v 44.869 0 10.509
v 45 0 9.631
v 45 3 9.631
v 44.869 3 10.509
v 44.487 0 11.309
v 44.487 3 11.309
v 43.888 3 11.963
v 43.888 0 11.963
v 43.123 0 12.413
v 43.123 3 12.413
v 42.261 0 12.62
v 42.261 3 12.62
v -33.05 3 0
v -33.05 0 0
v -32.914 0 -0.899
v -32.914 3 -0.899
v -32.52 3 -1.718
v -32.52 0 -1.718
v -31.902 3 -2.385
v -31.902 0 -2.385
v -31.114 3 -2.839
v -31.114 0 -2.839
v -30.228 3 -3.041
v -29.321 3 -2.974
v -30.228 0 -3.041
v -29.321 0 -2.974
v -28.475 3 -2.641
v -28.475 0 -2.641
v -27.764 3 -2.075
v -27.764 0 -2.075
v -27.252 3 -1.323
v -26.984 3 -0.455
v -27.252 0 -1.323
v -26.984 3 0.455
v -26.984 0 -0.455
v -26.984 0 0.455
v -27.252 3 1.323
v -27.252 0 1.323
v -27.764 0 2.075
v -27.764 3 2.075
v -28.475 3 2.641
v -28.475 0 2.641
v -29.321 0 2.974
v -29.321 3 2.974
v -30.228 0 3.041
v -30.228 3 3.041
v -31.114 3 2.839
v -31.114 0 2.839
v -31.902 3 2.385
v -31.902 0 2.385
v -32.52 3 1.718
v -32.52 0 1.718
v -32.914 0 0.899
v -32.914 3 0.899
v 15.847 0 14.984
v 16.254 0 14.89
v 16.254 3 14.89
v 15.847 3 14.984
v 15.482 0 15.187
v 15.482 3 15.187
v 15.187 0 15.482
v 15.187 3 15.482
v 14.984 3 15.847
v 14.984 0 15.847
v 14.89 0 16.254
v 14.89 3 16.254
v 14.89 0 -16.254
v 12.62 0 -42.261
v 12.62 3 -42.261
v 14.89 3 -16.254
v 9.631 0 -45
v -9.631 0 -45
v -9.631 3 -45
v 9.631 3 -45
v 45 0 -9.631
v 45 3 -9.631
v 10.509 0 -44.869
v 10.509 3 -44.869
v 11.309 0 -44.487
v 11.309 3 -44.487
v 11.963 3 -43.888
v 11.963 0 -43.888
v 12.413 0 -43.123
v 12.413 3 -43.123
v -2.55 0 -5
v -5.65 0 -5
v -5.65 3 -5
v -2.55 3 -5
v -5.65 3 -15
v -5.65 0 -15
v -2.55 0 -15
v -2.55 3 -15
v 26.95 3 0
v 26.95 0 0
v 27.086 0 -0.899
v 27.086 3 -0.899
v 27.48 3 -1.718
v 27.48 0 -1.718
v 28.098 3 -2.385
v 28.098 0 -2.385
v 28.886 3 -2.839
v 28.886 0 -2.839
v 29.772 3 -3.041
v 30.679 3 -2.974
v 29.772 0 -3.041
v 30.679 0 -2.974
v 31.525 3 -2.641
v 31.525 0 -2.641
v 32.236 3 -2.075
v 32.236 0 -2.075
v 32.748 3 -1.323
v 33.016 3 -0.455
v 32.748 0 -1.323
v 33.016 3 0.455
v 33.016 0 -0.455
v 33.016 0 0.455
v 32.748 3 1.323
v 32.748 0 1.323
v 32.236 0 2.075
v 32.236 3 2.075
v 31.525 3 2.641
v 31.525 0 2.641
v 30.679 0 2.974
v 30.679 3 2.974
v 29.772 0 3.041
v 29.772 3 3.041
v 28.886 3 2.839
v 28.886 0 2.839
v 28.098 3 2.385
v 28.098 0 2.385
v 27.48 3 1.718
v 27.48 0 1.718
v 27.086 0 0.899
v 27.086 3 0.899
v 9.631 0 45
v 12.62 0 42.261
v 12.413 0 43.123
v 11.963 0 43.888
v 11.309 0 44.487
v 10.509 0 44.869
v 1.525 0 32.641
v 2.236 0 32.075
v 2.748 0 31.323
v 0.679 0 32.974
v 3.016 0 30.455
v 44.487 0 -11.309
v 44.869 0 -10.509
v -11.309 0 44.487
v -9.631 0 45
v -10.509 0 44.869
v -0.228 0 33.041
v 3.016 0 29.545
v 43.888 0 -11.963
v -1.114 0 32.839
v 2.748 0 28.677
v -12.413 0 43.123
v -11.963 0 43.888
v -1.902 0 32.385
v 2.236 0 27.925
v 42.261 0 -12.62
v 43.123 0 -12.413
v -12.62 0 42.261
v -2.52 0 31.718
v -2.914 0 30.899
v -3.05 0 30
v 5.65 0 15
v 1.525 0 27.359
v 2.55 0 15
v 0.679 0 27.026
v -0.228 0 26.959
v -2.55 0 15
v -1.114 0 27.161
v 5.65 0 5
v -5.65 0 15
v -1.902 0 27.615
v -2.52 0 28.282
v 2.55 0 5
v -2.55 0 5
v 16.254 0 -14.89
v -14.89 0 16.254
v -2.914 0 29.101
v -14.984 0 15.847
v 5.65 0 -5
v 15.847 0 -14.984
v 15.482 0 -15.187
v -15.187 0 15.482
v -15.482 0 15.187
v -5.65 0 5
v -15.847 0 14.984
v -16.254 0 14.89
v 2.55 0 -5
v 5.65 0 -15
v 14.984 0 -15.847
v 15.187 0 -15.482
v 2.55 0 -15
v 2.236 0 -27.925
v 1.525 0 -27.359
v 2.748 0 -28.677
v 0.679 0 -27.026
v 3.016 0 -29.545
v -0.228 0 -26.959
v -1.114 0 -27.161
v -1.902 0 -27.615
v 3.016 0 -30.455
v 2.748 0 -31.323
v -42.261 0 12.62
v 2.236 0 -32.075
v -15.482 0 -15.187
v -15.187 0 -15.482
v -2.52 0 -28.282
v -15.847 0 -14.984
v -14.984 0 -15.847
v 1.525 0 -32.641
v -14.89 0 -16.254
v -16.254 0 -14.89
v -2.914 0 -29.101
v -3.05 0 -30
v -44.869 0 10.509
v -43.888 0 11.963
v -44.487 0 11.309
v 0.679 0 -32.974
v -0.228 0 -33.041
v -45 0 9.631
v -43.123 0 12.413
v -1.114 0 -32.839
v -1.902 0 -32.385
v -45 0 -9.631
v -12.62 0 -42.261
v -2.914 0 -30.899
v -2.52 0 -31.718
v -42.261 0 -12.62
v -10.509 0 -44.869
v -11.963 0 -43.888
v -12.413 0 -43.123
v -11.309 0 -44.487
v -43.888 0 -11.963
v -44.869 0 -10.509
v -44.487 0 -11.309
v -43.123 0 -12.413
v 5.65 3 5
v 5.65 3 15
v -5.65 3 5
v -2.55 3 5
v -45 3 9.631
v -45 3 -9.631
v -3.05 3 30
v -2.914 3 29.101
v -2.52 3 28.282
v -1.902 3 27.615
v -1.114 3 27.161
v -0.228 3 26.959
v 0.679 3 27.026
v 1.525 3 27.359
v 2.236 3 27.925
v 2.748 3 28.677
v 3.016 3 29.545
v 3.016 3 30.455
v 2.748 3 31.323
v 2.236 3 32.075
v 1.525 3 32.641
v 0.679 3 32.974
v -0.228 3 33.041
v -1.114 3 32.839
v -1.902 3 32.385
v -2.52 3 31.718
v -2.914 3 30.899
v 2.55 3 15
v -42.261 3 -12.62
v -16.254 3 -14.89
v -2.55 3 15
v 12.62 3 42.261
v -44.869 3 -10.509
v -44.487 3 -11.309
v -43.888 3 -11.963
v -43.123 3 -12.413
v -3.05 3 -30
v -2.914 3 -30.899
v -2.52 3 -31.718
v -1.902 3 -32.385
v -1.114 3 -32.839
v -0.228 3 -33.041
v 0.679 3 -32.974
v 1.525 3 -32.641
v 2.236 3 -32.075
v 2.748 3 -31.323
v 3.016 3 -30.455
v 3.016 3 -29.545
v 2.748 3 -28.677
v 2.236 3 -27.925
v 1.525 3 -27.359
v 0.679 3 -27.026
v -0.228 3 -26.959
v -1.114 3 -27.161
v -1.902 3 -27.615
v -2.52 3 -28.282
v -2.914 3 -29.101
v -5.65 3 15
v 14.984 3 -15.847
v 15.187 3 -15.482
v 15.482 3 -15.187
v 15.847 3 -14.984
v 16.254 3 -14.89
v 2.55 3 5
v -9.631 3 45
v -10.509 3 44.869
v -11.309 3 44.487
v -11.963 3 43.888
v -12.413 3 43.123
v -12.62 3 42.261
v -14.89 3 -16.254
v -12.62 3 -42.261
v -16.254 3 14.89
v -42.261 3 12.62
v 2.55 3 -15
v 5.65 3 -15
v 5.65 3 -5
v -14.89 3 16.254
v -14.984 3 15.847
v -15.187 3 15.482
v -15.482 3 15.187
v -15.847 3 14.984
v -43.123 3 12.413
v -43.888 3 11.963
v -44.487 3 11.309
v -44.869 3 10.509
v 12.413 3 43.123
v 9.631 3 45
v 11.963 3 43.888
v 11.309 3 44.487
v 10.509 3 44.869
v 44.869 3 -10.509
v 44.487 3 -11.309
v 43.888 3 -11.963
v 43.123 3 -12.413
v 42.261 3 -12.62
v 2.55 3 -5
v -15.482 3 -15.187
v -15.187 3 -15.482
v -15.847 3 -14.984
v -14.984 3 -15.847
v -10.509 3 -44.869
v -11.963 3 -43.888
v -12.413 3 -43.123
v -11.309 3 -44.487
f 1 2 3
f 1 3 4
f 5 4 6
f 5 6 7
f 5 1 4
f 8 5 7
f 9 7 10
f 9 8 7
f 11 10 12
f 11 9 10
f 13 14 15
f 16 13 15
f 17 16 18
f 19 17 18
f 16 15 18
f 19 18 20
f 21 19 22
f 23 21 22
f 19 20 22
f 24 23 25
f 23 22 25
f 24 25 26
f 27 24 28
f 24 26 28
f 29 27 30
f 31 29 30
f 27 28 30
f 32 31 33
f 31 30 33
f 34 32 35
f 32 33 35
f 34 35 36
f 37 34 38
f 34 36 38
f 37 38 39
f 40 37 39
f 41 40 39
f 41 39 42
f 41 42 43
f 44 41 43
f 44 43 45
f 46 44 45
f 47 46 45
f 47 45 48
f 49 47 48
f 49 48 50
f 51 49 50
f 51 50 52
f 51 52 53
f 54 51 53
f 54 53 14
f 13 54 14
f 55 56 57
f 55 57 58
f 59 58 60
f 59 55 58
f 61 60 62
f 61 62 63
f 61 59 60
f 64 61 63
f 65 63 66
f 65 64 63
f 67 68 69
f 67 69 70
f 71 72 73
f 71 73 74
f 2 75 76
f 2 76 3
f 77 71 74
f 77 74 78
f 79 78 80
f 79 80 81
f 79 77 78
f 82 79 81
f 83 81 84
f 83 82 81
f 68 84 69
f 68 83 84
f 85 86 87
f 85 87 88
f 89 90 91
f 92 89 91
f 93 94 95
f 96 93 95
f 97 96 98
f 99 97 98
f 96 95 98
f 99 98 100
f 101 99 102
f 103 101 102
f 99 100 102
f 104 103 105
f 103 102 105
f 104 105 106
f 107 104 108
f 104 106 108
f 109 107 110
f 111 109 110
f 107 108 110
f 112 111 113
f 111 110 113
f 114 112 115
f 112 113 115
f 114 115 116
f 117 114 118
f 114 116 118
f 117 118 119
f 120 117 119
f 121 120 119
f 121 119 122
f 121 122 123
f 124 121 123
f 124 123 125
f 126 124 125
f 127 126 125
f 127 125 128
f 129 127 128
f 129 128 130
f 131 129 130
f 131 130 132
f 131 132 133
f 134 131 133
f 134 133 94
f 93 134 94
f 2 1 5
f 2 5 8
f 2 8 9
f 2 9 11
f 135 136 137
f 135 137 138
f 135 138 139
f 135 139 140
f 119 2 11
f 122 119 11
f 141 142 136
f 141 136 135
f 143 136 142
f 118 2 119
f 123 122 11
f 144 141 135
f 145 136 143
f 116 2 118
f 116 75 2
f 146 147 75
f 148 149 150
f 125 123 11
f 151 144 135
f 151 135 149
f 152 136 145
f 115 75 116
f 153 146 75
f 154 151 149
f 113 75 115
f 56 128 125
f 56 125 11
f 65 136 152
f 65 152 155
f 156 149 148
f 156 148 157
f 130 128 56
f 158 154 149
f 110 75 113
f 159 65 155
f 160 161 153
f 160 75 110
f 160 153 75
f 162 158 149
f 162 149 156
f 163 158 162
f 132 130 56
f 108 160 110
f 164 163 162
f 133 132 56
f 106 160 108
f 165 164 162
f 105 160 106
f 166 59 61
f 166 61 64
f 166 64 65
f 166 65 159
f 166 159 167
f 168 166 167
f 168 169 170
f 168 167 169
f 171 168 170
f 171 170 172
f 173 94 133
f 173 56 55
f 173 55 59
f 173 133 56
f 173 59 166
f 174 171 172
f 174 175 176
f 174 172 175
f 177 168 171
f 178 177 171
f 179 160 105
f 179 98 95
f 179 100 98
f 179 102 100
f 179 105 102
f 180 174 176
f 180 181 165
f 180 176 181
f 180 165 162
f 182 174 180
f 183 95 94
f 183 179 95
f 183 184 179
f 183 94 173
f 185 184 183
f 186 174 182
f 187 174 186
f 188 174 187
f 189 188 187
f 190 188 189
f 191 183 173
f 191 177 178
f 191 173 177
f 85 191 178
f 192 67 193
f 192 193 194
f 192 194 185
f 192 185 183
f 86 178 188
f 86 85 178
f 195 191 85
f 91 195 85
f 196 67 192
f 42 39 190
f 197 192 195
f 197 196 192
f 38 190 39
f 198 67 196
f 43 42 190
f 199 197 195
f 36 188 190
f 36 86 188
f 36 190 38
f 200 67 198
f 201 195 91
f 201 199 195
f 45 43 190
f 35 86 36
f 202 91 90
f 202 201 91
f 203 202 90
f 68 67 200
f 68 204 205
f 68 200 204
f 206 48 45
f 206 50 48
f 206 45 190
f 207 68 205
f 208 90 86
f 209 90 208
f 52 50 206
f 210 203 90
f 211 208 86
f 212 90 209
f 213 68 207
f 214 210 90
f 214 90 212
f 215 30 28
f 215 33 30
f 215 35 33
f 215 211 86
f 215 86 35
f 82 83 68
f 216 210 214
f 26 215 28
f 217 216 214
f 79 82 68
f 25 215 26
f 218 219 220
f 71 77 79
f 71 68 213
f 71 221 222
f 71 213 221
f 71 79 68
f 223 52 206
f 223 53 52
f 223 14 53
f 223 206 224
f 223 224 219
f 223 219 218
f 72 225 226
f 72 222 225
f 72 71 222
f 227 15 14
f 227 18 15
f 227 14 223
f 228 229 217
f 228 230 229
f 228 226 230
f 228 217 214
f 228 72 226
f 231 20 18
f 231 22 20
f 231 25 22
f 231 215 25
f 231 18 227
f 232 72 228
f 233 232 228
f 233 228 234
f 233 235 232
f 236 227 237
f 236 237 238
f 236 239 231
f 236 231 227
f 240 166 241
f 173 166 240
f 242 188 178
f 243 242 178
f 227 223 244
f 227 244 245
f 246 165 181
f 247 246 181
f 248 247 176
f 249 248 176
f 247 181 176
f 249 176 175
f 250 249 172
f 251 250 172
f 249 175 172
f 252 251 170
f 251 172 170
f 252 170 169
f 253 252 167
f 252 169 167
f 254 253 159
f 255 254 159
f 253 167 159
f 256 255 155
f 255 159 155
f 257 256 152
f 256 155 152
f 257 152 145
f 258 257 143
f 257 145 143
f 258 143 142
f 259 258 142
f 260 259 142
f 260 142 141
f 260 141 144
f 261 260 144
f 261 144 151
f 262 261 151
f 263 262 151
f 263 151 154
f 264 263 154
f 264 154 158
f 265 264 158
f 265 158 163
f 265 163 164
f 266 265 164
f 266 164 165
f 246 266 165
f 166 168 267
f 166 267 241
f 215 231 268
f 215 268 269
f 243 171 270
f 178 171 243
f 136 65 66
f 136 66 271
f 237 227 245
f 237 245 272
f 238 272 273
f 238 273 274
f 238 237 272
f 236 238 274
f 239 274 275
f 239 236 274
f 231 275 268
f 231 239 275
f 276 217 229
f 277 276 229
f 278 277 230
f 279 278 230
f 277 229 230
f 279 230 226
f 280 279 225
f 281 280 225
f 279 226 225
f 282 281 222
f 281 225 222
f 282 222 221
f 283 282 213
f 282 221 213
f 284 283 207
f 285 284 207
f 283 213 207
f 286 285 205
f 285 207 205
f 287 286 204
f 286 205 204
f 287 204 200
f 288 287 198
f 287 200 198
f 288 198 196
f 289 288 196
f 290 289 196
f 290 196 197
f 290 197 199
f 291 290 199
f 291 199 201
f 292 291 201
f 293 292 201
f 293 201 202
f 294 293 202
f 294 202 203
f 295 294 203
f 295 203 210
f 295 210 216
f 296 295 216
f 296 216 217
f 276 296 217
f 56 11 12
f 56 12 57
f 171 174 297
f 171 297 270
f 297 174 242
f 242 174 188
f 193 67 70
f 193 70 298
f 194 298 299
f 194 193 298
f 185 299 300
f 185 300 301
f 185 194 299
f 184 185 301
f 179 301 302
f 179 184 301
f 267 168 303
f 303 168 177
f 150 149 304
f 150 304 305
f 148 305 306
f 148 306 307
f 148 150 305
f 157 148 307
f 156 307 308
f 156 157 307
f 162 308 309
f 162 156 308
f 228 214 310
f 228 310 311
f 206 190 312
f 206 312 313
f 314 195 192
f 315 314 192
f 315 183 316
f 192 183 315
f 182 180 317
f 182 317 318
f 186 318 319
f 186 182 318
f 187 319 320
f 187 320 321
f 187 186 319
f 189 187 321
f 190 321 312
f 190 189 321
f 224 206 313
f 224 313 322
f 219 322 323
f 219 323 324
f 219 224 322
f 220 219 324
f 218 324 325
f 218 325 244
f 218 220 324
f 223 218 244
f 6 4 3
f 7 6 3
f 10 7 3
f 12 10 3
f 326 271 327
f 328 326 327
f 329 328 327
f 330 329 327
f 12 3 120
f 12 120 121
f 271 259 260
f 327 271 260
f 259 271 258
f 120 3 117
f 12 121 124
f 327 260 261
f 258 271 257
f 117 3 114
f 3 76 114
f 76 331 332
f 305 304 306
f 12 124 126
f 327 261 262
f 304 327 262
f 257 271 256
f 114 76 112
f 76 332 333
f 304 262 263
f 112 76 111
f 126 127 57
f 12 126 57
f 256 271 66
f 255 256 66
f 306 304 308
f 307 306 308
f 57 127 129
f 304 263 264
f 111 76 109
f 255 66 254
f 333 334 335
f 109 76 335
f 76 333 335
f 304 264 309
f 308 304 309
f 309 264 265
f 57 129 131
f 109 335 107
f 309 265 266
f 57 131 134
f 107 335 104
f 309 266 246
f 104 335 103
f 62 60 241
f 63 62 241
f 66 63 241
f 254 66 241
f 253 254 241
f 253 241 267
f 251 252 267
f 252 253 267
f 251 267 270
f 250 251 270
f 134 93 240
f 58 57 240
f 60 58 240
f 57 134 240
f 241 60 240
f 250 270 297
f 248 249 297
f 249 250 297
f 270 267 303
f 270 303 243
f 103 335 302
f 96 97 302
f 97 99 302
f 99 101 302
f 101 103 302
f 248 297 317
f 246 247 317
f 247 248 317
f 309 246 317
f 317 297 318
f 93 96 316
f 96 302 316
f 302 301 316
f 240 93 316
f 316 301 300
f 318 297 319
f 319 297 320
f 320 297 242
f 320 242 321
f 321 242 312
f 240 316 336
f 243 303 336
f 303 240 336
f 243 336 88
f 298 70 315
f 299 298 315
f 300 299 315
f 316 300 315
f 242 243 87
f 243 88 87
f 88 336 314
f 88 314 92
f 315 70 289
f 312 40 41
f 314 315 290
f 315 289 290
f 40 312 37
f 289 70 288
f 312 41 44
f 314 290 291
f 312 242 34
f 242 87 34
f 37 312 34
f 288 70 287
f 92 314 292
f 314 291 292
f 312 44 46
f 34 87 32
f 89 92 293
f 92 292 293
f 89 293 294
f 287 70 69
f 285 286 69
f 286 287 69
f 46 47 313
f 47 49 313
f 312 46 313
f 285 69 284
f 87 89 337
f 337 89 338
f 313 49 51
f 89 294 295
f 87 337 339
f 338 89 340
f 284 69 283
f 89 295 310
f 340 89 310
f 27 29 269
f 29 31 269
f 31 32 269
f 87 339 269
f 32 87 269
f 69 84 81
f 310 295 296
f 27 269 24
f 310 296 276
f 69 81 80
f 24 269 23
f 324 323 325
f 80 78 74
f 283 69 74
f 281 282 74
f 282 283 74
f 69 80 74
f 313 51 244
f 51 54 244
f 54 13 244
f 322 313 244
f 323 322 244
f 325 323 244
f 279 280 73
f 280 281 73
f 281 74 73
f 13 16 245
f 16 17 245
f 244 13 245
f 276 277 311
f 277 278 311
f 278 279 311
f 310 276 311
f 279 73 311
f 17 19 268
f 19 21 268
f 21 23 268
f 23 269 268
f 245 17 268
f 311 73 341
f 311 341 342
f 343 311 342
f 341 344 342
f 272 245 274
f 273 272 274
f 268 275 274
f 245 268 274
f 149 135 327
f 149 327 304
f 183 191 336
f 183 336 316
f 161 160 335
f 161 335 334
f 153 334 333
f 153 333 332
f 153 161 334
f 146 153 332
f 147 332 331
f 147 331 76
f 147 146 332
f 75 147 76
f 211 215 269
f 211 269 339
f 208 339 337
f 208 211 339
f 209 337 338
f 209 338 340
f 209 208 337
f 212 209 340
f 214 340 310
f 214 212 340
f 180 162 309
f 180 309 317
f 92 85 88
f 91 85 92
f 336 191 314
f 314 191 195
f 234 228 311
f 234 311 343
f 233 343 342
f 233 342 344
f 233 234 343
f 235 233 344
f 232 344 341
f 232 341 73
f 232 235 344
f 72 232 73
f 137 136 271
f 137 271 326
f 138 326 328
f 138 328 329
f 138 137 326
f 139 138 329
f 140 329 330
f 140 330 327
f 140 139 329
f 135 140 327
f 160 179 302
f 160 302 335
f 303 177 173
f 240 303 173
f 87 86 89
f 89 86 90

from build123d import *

# Parameters (mm, degrees)
SKETCH1_W                      = 3.1
SKETCH1_H                      = 10
BOSS_EXTRUDE1_DEPTH            = 3
F_6_1_6_1_DIAMETER_HOLE1_D     = 6.1
F_6_1_6_1_DIAMETER_HOLE1_DEPTH = 10
F_6_1_6_1_DIAMETER_HOLE1_TIP   = 1.832624888


with BuildPart() as part:
    # Sketch1 → Boss-Extrude1 (new body)
    with BuildSketch(Plane(origin=(0, 0, 0), x_dir=(1, 0, 0), z_dir=(0, 1, 0))):
        with BuildLine():
            Line((-14.890188717, 16.254064822), (-12.620010218, 42.260882944))
            ThreePointArc((-12.620010218, 42.260882944), (-11.658361887, 44.211633879), (-9.631375063, 45))
            Line((-9.631375063, 45), (9.631375063, 45))
            ThreePointArc((9.631375063, 45), (11.658361887, 44.211633879), (12.620010218, 42.260882944))
            Line((12.620010218, 42.260882944), (14.890188717, 16.254064822))
            ThreePointArc((14.890188717, 16.254064822), (15.323846122, 15.323846122), (16.254064822, 14.890188717))
            Line((16.254064822, 14.890188717), (42.260882944, 12.620010218))
            ThreePointArc((42.260882944, 12.620010218), (44.211633879, 11.658361887), (45, 9.631375063))
            Line((45, 9.631375063), (45, -9.631375063))
            ThreePointArc((45, -9.631375063), (44.211633879, -11.658361887), (42.260882944, -12.620010218))
            Line((42.260882944, -12.620010218), (16.254064822, -14.890188717))
            ThreePointArc((16.254064822, -14.890188717), (15.323846122, -15.323846122), (14.890188717, -16.254064822))
            Line((14.890188717, -16.254064822), (12.620010218, -42.260882944))
            ThreePointArc((12.620010218, -42.260882944), (11.658361887, -44.211633879), (9.631375063, -45))
            Line((9.631375063, -45), (-9.631375063, -45))
            ThreePointArc((-9.631375063, -45), (-11.658361887, -44.211633879), (-12.620010218, -42.260882944))
            Line((-12.620010218, -42.260882944), (-14.890188717, -16.254064822))
            ThreePointArc((-14.890188717, -16.254064822), (-15.323846122, -15.323846122), (-16.254064822, -14.890188717))
            Line((-16.254064822, -14.890188717), (-42.260882944, -12.620010218))
            ThreePointArc((-42.260882944, -12.620010218), (-44.211633879, -11.658361887), (-45, -9.631375063))
            Line((-45, -9.631375063), (-45, 9.631375063))
            ThreePointArc((-45, 9.631375063), (-44.211633879, 11.658361887), (-42.260882944, 12.620010218))
            Line((-42.260882944, 12.620010218), (-16.254064822, 14.890188717))
            ThreePointArc((-16.254064822, 14.890188717), (-15.323846122, 15.323846122), (-14.890188717, 16.254064822))
        make_face()
        with Locations((-4.1, 10)):
            Rectangle(SKETCH1_W, SKETCH1_H, mode=Mode.SUBTRACT)
        with Locations((4.1, 10)):
            Rectangle(SKETCH1_W, SKETCH1_H, mode=Mode.SUBTRACT)
        with Locations((4.1, -10)):
            Rectangle(SKETCH1_W, SKETCH1_H, mode=Mode.SUBTRACT)
        with Locations((-4.1, -10)):
            Rectangle(SKETCH1_W, SKETCH1_H, mode=Mode.SUBTRACT)
    extrude(amount=BOSS_EXTRUDE1_DEPTH)

    # Ø6.1 (6.1) Diameter Hole1
    with Locations(Plane(origin=(0, 3, 0), x_dir=(1, 0, 0), z_dir=(0, 1, 0))):
        with Locations((0, -30), (30, 0), (0, 30), (-30, 0)):
            Hole(F_6_1_6_1_DIAMETER_HOLE1_D / 2, depth=F_6_1_6_1_DIAMETER_HOLE1_DEPTH)
            with Locations((0, 0, -(F_6_1_6_1_DIAMETER_HOLE1_DEPTH + F_6_1_6_1_DIAMETER_HOLE1_TIP / 2))):  # 118° drill point
                Cone(0, F_6_1_6_1_DIAMETER_HOLE1_D / 2, F_6_1_6_1_DIAMETER_HOLE1_TIP, mode=Mode.SUBTRACT)


solid = part.part
